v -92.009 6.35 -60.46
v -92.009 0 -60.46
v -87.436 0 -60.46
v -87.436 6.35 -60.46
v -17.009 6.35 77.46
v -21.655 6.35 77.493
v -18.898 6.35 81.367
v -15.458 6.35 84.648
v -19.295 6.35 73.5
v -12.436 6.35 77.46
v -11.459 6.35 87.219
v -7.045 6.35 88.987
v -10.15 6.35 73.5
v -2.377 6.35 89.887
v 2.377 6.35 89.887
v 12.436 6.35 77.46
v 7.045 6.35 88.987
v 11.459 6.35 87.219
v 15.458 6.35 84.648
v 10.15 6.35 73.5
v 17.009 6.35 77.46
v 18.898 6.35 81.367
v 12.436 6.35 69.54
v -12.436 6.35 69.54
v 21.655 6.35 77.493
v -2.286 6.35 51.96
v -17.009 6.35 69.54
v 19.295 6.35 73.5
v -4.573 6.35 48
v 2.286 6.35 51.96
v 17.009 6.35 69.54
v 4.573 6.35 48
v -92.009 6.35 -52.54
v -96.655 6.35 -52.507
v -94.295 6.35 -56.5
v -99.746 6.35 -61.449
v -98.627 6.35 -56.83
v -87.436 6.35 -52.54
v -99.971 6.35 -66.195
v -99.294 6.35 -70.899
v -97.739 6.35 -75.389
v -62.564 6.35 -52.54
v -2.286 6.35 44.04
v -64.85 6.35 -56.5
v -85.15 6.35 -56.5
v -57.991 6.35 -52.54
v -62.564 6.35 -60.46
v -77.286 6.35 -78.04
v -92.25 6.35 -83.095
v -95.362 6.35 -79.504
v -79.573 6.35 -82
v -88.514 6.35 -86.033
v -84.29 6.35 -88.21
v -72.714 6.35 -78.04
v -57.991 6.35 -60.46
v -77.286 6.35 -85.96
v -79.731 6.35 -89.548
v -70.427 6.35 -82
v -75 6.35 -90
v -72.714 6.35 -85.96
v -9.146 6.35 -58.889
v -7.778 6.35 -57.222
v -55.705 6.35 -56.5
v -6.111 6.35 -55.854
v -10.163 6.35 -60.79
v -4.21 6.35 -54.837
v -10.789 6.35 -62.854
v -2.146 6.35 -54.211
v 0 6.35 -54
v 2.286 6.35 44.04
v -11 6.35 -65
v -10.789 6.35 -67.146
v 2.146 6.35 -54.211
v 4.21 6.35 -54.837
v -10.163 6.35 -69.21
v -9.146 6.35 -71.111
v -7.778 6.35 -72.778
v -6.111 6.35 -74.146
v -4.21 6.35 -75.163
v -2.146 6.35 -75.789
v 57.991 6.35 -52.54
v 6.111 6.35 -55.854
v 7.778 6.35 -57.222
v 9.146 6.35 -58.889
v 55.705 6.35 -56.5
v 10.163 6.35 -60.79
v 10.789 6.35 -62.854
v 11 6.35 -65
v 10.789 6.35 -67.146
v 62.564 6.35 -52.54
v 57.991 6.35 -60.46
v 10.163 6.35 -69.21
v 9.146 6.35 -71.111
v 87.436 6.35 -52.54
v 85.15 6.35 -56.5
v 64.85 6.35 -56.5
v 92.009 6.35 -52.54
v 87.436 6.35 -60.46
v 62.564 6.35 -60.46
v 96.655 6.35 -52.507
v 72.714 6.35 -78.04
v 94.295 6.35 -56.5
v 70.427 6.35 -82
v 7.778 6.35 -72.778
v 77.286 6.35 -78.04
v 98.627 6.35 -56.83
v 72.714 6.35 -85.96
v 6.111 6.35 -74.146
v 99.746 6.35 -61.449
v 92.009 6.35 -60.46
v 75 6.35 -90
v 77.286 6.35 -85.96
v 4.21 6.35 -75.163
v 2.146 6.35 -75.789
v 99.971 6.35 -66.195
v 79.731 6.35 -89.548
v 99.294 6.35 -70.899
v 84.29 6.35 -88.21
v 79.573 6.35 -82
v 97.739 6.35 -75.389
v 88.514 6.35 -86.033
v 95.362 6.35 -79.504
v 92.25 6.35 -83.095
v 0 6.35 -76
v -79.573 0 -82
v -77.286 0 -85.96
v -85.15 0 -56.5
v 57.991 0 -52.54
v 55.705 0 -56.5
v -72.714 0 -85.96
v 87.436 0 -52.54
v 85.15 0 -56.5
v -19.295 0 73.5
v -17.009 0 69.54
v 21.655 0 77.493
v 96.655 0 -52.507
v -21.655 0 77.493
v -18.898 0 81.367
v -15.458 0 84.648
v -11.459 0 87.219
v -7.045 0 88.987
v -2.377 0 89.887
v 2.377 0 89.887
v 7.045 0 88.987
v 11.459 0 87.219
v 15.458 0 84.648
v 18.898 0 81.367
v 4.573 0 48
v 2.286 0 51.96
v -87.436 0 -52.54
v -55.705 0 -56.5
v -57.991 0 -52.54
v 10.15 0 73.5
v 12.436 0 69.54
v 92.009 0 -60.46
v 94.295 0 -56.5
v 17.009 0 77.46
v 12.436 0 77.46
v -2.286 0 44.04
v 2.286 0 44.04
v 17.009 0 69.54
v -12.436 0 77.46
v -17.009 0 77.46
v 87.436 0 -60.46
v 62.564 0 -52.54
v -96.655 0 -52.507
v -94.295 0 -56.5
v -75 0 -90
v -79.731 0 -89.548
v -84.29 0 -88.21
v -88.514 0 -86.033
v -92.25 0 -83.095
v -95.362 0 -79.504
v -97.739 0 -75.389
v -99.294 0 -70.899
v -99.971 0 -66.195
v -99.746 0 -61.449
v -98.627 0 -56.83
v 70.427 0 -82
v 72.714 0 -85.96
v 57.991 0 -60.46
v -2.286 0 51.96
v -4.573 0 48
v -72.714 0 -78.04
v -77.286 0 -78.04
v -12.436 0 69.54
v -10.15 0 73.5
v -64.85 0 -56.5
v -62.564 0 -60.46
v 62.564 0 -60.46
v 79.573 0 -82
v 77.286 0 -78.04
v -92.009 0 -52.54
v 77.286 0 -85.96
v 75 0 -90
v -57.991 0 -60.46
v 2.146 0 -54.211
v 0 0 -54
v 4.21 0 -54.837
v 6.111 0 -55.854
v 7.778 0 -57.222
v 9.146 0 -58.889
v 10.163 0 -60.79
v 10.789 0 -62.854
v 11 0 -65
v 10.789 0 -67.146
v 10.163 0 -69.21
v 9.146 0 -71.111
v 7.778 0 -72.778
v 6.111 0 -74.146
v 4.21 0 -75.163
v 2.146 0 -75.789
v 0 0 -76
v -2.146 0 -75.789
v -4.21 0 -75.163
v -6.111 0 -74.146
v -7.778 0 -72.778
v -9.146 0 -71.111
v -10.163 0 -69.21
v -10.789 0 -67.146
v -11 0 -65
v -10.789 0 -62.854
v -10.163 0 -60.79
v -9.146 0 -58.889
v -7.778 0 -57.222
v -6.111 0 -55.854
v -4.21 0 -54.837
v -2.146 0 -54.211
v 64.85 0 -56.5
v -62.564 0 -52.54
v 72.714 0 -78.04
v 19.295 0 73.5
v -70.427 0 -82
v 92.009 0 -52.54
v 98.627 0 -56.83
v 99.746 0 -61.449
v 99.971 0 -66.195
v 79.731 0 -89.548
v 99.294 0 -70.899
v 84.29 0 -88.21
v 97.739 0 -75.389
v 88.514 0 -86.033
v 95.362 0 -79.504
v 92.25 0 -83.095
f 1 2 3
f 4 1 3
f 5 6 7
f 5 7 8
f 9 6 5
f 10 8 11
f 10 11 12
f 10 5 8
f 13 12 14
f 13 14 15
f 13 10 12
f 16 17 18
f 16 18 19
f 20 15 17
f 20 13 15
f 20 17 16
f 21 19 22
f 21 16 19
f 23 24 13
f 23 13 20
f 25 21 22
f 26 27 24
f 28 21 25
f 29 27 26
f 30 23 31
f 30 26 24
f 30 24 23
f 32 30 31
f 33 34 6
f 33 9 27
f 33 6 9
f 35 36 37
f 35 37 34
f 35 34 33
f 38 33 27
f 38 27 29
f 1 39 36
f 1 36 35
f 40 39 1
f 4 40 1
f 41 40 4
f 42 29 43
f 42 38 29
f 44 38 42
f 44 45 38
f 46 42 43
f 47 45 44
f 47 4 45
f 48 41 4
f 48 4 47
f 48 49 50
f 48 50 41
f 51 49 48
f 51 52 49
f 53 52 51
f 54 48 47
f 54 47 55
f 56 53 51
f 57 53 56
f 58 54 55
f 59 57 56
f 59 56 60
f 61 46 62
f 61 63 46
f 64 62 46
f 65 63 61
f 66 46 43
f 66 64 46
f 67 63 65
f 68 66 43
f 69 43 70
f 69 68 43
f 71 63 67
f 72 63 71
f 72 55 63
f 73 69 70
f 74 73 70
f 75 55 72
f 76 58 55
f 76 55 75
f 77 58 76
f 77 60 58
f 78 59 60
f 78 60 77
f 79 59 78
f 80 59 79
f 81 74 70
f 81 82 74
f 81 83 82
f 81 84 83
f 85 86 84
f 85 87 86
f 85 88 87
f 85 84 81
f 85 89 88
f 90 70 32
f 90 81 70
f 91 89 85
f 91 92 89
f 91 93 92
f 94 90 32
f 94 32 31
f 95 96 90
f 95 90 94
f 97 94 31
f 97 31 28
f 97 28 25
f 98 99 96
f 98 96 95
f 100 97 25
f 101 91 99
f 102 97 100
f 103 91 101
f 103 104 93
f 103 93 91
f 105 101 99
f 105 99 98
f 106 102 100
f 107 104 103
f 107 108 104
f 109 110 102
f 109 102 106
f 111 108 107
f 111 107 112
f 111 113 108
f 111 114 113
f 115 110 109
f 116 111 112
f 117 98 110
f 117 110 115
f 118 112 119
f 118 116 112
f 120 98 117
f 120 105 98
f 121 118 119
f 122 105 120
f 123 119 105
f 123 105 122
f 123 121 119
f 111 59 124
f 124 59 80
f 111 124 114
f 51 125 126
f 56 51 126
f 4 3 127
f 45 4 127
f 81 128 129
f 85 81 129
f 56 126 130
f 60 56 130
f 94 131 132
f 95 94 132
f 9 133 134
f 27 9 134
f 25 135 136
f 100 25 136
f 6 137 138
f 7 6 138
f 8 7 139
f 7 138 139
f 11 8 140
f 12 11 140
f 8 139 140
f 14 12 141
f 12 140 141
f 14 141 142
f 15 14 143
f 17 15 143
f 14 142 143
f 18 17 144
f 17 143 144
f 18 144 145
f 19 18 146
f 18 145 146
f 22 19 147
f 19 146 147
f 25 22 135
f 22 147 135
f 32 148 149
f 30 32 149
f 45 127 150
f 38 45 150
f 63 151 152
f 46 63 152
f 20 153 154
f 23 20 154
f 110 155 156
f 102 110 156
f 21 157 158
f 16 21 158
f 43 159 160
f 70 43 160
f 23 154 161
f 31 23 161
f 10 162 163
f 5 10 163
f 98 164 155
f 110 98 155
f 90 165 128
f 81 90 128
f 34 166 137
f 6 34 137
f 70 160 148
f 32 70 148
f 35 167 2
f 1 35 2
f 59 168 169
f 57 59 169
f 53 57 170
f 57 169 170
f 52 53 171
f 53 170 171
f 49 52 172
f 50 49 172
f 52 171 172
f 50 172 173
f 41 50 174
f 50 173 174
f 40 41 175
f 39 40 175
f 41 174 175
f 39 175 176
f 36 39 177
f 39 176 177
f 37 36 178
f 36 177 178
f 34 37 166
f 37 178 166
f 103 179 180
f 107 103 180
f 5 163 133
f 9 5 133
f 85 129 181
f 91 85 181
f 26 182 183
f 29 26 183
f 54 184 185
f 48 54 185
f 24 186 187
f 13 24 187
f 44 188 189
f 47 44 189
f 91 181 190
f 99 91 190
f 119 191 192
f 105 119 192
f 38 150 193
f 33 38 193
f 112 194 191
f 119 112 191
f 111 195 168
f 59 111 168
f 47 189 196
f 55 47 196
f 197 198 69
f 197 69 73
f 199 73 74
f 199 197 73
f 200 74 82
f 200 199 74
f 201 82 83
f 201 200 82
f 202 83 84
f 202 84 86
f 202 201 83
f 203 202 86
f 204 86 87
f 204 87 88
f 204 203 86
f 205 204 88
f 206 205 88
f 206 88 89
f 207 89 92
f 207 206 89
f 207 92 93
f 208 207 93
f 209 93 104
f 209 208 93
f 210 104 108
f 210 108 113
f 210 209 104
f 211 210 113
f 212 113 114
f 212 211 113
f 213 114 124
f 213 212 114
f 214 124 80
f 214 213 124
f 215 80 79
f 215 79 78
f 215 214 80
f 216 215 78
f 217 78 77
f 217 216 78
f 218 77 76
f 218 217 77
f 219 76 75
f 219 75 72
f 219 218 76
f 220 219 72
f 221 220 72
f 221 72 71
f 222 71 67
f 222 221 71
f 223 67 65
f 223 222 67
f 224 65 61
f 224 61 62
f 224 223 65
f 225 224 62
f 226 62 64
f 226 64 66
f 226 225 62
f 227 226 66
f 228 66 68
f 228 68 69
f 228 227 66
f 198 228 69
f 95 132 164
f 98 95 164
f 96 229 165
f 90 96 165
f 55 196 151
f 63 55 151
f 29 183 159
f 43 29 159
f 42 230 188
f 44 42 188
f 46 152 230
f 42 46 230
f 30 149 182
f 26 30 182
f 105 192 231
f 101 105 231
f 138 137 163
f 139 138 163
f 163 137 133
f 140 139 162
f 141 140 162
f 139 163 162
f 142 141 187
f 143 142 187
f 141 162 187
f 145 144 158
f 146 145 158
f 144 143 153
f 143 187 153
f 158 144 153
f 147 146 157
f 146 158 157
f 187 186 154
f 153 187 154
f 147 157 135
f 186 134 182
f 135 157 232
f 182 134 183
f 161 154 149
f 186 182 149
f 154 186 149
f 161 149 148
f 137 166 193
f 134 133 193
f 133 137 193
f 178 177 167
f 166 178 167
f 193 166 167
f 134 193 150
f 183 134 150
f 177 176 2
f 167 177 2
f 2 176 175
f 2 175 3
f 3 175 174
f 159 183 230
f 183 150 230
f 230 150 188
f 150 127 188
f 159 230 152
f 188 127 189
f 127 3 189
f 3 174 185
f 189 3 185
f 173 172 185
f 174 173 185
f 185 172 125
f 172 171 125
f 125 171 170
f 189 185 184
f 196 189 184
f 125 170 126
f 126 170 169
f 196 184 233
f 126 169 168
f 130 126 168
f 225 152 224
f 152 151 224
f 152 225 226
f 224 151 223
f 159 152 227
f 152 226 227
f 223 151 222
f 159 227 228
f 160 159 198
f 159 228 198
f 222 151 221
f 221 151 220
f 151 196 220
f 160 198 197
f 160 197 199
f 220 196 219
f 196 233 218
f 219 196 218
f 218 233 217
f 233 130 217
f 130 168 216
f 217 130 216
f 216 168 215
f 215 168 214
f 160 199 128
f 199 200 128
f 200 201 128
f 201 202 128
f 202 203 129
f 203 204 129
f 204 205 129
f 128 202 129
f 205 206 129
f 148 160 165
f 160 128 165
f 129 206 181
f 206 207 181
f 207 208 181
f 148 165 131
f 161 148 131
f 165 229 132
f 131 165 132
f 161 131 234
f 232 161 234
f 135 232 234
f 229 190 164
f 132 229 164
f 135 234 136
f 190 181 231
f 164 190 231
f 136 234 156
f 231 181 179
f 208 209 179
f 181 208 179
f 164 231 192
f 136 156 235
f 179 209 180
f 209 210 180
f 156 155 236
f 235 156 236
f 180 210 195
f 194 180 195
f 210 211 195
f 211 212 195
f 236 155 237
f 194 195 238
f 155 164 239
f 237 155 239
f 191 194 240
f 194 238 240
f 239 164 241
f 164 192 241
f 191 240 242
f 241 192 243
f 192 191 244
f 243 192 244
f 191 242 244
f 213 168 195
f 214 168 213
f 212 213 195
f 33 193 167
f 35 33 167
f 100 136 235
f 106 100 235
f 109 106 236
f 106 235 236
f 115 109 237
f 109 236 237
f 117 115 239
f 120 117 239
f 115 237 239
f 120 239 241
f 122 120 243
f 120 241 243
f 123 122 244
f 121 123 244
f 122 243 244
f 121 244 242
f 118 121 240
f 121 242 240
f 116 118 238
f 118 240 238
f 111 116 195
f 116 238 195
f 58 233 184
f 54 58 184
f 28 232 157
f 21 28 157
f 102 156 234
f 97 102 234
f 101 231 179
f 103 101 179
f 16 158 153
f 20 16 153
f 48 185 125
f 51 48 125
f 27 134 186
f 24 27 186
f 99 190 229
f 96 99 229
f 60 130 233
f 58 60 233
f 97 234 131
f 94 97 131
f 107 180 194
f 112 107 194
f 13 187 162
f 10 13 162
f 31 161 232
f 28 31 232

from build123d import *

# Parameters (mm, degrees)
ESQUISSE1_R             = 11
BOSS_EXTRU_1_DEPTH      = 6.35
ENL_V_MAT_EXTRU_1_DEPTH = 135.686014493


with BuildPart() as part:
    # Esquisse1 → Boss.-Extru.1 (new body)
    with BuildSketch(Plane(origin=(0, 0, 0), x_dir=(1, 0, 0), z_dir=(0, 1, 0))):
        with BuildLine():
            Line((-96.654639651, 52.506938663), (-21.654639651, -77.493061337))
            ThreePointArc((-21.654639651, -77.493061337), (0, -90), (21.654639651, -77.493061337))
            Line((21.654639651, -77.493061337), (96.654639651, 52.506938663))
            ThreePointArc((96.654639651, 52.506938663), (96.648631983, 77.50346885), (75, 90))
            Line((75, 90), (-75, 90))
            ThreePointArc((-75, 90), (-96.648631983, 77.50346885), (-96.654639651, 52.506938663))
        make_face()
        with Locations(Location((0, 65, 0), (0, 0, 270))):
            Circle(ESQUISSE1_R, mode=Mode.SUBTRACT)
    extrude(amount=BOSS_EXTRU_1_DEPTH)

    # Esquisse3 → Enlèv. mat.-Extru.1 (cut, through all)
    with BuildSketch(Plane.XZ):
        Polygon((-79.572614132, -82), (-77.286307066, -85.96), (-72.713692934, -85.96), (-70.427385868, -82), (-72.713692934, -78.04), (-77.286307066, -78.04), align=None)
        Polygon((-94.295045996, -56.5), (-92.00873893, -60.46), (-87.436124798, -60.46), (-85.149817732, -56.5), (-87.436124798, -52.54), (-92.00873893, -52.54), align=None)
        Polygon((-64.850182268, -56.5), (-62.563875202, -60.46), (-57.99126107, -60.46), (-55.704954004, -56.5), (-57.99126107, -52.54), (-62.563875202, -52.54), align=None)
        Polygon((55.704954004, -56.5), (57.99126107, -60.46), (62.563875202, -60.46), (64.850182268, -56.5), (62.563875202, -52.54), (57.99126107, -52.54), align=None)
        Polygon((70.427385868, -82), (72.713692934, -85.96), (77.286307066, -85.96), (79.572614132, -82), (77.286307066, -78.04), (72.713692934, -78.04), align=None)
        Polygon((85.149817732, -56.5), (87.436124798, -60.46), (92.00873893, -60.46), (94.295045996, -56.5), (92.00873893, -52.54), (87.436124798, -52.54), align=None)
        Polygon((-4.572614132, 48), (-2.286307066, 44.04), (2.286307066, 44.04), (4.572614132, 48), (2.286307066, 51.96), (-2.286307066, 51.96), align=None)
        Polygon((-19.295045996, 73.5), (-17.00873893, 69.54), (-12.436124798, 69.54), (-10.149817732, 73.5), (-12.436124798, 77.46), (-17.00873893, 77.46), align=None)
        Polygon((10.149817732, 73.5), (12.436124798, 69.54), (17.00873893, 69.54), (19.295045996, 73.5), (17.00873893, 77.46), (12.436124798, 77.46), align=None)
    extrude(amount=-ENL_V_MAT_EXTRU_1_DEPTH, mode=Mode.SUBTRACT)


solid = part.part
